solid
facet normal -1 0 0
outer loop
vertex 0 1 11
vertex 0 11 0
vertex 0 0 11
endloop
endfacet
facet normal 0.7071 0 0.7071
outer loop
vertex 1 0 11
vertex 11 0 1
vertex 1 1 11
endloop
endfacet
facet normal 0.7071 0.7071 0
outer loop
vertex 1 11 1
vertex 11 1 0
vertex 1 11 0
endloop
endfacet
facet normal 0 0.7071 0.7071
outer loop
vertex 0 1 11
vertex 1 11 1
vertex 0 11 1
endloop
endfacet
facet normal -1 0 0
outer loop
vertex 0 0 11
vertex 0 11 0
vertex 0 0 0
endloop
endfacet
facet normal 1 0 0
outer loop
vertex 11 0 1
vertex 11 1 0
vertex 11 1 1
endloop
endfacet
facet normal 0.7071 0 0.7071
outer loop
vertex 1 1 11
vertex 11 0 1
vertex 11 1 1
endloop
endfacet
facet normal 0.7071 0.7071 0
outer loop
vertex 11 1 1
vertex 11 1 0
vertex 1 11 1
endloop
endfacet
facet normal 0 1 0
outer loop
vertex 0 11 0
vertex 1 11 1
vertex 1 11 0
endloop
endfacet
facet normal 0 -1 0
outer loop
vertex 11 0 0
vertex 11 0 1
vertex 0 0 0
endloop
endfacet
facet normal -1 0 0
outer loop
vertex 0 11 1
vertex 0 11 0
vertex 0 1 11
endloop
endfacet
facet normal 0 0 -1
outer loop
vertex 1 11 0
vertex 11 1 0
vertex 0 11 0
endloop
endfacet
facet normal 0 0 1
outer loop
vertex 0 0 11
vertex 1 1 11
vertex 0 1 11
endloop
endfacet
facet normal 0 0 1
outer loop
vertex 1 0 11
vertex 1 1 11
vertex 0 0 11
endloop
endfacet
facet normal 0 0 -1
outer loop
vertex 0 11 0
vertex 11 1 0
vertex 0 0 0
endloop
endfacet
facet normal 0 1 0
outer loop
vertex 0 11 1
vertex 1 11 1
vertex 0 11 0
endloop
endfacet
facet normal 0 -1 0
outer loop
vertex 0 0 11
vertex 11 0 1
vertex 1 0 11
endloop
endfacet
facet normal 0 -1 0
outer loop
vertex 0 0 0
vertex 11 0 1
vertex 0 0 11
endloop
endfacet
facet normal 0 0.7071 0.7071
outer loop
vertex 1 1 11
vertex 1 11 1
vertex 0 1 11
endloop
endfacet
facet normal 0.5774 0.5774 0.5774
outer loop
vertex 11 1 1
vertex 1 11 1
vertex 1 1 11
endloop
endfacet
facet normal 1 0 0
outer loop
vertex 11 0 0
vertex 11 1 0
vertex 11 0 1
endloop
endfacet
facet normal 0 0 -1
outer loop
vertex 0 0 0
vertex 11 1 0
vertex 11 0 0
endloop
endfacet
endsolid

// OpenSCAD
hull(){ cube(1); translate([10,0,0]) cube(1); translate([0,10,0]) cube(1); translate([0,0,10]) cube(1); }
